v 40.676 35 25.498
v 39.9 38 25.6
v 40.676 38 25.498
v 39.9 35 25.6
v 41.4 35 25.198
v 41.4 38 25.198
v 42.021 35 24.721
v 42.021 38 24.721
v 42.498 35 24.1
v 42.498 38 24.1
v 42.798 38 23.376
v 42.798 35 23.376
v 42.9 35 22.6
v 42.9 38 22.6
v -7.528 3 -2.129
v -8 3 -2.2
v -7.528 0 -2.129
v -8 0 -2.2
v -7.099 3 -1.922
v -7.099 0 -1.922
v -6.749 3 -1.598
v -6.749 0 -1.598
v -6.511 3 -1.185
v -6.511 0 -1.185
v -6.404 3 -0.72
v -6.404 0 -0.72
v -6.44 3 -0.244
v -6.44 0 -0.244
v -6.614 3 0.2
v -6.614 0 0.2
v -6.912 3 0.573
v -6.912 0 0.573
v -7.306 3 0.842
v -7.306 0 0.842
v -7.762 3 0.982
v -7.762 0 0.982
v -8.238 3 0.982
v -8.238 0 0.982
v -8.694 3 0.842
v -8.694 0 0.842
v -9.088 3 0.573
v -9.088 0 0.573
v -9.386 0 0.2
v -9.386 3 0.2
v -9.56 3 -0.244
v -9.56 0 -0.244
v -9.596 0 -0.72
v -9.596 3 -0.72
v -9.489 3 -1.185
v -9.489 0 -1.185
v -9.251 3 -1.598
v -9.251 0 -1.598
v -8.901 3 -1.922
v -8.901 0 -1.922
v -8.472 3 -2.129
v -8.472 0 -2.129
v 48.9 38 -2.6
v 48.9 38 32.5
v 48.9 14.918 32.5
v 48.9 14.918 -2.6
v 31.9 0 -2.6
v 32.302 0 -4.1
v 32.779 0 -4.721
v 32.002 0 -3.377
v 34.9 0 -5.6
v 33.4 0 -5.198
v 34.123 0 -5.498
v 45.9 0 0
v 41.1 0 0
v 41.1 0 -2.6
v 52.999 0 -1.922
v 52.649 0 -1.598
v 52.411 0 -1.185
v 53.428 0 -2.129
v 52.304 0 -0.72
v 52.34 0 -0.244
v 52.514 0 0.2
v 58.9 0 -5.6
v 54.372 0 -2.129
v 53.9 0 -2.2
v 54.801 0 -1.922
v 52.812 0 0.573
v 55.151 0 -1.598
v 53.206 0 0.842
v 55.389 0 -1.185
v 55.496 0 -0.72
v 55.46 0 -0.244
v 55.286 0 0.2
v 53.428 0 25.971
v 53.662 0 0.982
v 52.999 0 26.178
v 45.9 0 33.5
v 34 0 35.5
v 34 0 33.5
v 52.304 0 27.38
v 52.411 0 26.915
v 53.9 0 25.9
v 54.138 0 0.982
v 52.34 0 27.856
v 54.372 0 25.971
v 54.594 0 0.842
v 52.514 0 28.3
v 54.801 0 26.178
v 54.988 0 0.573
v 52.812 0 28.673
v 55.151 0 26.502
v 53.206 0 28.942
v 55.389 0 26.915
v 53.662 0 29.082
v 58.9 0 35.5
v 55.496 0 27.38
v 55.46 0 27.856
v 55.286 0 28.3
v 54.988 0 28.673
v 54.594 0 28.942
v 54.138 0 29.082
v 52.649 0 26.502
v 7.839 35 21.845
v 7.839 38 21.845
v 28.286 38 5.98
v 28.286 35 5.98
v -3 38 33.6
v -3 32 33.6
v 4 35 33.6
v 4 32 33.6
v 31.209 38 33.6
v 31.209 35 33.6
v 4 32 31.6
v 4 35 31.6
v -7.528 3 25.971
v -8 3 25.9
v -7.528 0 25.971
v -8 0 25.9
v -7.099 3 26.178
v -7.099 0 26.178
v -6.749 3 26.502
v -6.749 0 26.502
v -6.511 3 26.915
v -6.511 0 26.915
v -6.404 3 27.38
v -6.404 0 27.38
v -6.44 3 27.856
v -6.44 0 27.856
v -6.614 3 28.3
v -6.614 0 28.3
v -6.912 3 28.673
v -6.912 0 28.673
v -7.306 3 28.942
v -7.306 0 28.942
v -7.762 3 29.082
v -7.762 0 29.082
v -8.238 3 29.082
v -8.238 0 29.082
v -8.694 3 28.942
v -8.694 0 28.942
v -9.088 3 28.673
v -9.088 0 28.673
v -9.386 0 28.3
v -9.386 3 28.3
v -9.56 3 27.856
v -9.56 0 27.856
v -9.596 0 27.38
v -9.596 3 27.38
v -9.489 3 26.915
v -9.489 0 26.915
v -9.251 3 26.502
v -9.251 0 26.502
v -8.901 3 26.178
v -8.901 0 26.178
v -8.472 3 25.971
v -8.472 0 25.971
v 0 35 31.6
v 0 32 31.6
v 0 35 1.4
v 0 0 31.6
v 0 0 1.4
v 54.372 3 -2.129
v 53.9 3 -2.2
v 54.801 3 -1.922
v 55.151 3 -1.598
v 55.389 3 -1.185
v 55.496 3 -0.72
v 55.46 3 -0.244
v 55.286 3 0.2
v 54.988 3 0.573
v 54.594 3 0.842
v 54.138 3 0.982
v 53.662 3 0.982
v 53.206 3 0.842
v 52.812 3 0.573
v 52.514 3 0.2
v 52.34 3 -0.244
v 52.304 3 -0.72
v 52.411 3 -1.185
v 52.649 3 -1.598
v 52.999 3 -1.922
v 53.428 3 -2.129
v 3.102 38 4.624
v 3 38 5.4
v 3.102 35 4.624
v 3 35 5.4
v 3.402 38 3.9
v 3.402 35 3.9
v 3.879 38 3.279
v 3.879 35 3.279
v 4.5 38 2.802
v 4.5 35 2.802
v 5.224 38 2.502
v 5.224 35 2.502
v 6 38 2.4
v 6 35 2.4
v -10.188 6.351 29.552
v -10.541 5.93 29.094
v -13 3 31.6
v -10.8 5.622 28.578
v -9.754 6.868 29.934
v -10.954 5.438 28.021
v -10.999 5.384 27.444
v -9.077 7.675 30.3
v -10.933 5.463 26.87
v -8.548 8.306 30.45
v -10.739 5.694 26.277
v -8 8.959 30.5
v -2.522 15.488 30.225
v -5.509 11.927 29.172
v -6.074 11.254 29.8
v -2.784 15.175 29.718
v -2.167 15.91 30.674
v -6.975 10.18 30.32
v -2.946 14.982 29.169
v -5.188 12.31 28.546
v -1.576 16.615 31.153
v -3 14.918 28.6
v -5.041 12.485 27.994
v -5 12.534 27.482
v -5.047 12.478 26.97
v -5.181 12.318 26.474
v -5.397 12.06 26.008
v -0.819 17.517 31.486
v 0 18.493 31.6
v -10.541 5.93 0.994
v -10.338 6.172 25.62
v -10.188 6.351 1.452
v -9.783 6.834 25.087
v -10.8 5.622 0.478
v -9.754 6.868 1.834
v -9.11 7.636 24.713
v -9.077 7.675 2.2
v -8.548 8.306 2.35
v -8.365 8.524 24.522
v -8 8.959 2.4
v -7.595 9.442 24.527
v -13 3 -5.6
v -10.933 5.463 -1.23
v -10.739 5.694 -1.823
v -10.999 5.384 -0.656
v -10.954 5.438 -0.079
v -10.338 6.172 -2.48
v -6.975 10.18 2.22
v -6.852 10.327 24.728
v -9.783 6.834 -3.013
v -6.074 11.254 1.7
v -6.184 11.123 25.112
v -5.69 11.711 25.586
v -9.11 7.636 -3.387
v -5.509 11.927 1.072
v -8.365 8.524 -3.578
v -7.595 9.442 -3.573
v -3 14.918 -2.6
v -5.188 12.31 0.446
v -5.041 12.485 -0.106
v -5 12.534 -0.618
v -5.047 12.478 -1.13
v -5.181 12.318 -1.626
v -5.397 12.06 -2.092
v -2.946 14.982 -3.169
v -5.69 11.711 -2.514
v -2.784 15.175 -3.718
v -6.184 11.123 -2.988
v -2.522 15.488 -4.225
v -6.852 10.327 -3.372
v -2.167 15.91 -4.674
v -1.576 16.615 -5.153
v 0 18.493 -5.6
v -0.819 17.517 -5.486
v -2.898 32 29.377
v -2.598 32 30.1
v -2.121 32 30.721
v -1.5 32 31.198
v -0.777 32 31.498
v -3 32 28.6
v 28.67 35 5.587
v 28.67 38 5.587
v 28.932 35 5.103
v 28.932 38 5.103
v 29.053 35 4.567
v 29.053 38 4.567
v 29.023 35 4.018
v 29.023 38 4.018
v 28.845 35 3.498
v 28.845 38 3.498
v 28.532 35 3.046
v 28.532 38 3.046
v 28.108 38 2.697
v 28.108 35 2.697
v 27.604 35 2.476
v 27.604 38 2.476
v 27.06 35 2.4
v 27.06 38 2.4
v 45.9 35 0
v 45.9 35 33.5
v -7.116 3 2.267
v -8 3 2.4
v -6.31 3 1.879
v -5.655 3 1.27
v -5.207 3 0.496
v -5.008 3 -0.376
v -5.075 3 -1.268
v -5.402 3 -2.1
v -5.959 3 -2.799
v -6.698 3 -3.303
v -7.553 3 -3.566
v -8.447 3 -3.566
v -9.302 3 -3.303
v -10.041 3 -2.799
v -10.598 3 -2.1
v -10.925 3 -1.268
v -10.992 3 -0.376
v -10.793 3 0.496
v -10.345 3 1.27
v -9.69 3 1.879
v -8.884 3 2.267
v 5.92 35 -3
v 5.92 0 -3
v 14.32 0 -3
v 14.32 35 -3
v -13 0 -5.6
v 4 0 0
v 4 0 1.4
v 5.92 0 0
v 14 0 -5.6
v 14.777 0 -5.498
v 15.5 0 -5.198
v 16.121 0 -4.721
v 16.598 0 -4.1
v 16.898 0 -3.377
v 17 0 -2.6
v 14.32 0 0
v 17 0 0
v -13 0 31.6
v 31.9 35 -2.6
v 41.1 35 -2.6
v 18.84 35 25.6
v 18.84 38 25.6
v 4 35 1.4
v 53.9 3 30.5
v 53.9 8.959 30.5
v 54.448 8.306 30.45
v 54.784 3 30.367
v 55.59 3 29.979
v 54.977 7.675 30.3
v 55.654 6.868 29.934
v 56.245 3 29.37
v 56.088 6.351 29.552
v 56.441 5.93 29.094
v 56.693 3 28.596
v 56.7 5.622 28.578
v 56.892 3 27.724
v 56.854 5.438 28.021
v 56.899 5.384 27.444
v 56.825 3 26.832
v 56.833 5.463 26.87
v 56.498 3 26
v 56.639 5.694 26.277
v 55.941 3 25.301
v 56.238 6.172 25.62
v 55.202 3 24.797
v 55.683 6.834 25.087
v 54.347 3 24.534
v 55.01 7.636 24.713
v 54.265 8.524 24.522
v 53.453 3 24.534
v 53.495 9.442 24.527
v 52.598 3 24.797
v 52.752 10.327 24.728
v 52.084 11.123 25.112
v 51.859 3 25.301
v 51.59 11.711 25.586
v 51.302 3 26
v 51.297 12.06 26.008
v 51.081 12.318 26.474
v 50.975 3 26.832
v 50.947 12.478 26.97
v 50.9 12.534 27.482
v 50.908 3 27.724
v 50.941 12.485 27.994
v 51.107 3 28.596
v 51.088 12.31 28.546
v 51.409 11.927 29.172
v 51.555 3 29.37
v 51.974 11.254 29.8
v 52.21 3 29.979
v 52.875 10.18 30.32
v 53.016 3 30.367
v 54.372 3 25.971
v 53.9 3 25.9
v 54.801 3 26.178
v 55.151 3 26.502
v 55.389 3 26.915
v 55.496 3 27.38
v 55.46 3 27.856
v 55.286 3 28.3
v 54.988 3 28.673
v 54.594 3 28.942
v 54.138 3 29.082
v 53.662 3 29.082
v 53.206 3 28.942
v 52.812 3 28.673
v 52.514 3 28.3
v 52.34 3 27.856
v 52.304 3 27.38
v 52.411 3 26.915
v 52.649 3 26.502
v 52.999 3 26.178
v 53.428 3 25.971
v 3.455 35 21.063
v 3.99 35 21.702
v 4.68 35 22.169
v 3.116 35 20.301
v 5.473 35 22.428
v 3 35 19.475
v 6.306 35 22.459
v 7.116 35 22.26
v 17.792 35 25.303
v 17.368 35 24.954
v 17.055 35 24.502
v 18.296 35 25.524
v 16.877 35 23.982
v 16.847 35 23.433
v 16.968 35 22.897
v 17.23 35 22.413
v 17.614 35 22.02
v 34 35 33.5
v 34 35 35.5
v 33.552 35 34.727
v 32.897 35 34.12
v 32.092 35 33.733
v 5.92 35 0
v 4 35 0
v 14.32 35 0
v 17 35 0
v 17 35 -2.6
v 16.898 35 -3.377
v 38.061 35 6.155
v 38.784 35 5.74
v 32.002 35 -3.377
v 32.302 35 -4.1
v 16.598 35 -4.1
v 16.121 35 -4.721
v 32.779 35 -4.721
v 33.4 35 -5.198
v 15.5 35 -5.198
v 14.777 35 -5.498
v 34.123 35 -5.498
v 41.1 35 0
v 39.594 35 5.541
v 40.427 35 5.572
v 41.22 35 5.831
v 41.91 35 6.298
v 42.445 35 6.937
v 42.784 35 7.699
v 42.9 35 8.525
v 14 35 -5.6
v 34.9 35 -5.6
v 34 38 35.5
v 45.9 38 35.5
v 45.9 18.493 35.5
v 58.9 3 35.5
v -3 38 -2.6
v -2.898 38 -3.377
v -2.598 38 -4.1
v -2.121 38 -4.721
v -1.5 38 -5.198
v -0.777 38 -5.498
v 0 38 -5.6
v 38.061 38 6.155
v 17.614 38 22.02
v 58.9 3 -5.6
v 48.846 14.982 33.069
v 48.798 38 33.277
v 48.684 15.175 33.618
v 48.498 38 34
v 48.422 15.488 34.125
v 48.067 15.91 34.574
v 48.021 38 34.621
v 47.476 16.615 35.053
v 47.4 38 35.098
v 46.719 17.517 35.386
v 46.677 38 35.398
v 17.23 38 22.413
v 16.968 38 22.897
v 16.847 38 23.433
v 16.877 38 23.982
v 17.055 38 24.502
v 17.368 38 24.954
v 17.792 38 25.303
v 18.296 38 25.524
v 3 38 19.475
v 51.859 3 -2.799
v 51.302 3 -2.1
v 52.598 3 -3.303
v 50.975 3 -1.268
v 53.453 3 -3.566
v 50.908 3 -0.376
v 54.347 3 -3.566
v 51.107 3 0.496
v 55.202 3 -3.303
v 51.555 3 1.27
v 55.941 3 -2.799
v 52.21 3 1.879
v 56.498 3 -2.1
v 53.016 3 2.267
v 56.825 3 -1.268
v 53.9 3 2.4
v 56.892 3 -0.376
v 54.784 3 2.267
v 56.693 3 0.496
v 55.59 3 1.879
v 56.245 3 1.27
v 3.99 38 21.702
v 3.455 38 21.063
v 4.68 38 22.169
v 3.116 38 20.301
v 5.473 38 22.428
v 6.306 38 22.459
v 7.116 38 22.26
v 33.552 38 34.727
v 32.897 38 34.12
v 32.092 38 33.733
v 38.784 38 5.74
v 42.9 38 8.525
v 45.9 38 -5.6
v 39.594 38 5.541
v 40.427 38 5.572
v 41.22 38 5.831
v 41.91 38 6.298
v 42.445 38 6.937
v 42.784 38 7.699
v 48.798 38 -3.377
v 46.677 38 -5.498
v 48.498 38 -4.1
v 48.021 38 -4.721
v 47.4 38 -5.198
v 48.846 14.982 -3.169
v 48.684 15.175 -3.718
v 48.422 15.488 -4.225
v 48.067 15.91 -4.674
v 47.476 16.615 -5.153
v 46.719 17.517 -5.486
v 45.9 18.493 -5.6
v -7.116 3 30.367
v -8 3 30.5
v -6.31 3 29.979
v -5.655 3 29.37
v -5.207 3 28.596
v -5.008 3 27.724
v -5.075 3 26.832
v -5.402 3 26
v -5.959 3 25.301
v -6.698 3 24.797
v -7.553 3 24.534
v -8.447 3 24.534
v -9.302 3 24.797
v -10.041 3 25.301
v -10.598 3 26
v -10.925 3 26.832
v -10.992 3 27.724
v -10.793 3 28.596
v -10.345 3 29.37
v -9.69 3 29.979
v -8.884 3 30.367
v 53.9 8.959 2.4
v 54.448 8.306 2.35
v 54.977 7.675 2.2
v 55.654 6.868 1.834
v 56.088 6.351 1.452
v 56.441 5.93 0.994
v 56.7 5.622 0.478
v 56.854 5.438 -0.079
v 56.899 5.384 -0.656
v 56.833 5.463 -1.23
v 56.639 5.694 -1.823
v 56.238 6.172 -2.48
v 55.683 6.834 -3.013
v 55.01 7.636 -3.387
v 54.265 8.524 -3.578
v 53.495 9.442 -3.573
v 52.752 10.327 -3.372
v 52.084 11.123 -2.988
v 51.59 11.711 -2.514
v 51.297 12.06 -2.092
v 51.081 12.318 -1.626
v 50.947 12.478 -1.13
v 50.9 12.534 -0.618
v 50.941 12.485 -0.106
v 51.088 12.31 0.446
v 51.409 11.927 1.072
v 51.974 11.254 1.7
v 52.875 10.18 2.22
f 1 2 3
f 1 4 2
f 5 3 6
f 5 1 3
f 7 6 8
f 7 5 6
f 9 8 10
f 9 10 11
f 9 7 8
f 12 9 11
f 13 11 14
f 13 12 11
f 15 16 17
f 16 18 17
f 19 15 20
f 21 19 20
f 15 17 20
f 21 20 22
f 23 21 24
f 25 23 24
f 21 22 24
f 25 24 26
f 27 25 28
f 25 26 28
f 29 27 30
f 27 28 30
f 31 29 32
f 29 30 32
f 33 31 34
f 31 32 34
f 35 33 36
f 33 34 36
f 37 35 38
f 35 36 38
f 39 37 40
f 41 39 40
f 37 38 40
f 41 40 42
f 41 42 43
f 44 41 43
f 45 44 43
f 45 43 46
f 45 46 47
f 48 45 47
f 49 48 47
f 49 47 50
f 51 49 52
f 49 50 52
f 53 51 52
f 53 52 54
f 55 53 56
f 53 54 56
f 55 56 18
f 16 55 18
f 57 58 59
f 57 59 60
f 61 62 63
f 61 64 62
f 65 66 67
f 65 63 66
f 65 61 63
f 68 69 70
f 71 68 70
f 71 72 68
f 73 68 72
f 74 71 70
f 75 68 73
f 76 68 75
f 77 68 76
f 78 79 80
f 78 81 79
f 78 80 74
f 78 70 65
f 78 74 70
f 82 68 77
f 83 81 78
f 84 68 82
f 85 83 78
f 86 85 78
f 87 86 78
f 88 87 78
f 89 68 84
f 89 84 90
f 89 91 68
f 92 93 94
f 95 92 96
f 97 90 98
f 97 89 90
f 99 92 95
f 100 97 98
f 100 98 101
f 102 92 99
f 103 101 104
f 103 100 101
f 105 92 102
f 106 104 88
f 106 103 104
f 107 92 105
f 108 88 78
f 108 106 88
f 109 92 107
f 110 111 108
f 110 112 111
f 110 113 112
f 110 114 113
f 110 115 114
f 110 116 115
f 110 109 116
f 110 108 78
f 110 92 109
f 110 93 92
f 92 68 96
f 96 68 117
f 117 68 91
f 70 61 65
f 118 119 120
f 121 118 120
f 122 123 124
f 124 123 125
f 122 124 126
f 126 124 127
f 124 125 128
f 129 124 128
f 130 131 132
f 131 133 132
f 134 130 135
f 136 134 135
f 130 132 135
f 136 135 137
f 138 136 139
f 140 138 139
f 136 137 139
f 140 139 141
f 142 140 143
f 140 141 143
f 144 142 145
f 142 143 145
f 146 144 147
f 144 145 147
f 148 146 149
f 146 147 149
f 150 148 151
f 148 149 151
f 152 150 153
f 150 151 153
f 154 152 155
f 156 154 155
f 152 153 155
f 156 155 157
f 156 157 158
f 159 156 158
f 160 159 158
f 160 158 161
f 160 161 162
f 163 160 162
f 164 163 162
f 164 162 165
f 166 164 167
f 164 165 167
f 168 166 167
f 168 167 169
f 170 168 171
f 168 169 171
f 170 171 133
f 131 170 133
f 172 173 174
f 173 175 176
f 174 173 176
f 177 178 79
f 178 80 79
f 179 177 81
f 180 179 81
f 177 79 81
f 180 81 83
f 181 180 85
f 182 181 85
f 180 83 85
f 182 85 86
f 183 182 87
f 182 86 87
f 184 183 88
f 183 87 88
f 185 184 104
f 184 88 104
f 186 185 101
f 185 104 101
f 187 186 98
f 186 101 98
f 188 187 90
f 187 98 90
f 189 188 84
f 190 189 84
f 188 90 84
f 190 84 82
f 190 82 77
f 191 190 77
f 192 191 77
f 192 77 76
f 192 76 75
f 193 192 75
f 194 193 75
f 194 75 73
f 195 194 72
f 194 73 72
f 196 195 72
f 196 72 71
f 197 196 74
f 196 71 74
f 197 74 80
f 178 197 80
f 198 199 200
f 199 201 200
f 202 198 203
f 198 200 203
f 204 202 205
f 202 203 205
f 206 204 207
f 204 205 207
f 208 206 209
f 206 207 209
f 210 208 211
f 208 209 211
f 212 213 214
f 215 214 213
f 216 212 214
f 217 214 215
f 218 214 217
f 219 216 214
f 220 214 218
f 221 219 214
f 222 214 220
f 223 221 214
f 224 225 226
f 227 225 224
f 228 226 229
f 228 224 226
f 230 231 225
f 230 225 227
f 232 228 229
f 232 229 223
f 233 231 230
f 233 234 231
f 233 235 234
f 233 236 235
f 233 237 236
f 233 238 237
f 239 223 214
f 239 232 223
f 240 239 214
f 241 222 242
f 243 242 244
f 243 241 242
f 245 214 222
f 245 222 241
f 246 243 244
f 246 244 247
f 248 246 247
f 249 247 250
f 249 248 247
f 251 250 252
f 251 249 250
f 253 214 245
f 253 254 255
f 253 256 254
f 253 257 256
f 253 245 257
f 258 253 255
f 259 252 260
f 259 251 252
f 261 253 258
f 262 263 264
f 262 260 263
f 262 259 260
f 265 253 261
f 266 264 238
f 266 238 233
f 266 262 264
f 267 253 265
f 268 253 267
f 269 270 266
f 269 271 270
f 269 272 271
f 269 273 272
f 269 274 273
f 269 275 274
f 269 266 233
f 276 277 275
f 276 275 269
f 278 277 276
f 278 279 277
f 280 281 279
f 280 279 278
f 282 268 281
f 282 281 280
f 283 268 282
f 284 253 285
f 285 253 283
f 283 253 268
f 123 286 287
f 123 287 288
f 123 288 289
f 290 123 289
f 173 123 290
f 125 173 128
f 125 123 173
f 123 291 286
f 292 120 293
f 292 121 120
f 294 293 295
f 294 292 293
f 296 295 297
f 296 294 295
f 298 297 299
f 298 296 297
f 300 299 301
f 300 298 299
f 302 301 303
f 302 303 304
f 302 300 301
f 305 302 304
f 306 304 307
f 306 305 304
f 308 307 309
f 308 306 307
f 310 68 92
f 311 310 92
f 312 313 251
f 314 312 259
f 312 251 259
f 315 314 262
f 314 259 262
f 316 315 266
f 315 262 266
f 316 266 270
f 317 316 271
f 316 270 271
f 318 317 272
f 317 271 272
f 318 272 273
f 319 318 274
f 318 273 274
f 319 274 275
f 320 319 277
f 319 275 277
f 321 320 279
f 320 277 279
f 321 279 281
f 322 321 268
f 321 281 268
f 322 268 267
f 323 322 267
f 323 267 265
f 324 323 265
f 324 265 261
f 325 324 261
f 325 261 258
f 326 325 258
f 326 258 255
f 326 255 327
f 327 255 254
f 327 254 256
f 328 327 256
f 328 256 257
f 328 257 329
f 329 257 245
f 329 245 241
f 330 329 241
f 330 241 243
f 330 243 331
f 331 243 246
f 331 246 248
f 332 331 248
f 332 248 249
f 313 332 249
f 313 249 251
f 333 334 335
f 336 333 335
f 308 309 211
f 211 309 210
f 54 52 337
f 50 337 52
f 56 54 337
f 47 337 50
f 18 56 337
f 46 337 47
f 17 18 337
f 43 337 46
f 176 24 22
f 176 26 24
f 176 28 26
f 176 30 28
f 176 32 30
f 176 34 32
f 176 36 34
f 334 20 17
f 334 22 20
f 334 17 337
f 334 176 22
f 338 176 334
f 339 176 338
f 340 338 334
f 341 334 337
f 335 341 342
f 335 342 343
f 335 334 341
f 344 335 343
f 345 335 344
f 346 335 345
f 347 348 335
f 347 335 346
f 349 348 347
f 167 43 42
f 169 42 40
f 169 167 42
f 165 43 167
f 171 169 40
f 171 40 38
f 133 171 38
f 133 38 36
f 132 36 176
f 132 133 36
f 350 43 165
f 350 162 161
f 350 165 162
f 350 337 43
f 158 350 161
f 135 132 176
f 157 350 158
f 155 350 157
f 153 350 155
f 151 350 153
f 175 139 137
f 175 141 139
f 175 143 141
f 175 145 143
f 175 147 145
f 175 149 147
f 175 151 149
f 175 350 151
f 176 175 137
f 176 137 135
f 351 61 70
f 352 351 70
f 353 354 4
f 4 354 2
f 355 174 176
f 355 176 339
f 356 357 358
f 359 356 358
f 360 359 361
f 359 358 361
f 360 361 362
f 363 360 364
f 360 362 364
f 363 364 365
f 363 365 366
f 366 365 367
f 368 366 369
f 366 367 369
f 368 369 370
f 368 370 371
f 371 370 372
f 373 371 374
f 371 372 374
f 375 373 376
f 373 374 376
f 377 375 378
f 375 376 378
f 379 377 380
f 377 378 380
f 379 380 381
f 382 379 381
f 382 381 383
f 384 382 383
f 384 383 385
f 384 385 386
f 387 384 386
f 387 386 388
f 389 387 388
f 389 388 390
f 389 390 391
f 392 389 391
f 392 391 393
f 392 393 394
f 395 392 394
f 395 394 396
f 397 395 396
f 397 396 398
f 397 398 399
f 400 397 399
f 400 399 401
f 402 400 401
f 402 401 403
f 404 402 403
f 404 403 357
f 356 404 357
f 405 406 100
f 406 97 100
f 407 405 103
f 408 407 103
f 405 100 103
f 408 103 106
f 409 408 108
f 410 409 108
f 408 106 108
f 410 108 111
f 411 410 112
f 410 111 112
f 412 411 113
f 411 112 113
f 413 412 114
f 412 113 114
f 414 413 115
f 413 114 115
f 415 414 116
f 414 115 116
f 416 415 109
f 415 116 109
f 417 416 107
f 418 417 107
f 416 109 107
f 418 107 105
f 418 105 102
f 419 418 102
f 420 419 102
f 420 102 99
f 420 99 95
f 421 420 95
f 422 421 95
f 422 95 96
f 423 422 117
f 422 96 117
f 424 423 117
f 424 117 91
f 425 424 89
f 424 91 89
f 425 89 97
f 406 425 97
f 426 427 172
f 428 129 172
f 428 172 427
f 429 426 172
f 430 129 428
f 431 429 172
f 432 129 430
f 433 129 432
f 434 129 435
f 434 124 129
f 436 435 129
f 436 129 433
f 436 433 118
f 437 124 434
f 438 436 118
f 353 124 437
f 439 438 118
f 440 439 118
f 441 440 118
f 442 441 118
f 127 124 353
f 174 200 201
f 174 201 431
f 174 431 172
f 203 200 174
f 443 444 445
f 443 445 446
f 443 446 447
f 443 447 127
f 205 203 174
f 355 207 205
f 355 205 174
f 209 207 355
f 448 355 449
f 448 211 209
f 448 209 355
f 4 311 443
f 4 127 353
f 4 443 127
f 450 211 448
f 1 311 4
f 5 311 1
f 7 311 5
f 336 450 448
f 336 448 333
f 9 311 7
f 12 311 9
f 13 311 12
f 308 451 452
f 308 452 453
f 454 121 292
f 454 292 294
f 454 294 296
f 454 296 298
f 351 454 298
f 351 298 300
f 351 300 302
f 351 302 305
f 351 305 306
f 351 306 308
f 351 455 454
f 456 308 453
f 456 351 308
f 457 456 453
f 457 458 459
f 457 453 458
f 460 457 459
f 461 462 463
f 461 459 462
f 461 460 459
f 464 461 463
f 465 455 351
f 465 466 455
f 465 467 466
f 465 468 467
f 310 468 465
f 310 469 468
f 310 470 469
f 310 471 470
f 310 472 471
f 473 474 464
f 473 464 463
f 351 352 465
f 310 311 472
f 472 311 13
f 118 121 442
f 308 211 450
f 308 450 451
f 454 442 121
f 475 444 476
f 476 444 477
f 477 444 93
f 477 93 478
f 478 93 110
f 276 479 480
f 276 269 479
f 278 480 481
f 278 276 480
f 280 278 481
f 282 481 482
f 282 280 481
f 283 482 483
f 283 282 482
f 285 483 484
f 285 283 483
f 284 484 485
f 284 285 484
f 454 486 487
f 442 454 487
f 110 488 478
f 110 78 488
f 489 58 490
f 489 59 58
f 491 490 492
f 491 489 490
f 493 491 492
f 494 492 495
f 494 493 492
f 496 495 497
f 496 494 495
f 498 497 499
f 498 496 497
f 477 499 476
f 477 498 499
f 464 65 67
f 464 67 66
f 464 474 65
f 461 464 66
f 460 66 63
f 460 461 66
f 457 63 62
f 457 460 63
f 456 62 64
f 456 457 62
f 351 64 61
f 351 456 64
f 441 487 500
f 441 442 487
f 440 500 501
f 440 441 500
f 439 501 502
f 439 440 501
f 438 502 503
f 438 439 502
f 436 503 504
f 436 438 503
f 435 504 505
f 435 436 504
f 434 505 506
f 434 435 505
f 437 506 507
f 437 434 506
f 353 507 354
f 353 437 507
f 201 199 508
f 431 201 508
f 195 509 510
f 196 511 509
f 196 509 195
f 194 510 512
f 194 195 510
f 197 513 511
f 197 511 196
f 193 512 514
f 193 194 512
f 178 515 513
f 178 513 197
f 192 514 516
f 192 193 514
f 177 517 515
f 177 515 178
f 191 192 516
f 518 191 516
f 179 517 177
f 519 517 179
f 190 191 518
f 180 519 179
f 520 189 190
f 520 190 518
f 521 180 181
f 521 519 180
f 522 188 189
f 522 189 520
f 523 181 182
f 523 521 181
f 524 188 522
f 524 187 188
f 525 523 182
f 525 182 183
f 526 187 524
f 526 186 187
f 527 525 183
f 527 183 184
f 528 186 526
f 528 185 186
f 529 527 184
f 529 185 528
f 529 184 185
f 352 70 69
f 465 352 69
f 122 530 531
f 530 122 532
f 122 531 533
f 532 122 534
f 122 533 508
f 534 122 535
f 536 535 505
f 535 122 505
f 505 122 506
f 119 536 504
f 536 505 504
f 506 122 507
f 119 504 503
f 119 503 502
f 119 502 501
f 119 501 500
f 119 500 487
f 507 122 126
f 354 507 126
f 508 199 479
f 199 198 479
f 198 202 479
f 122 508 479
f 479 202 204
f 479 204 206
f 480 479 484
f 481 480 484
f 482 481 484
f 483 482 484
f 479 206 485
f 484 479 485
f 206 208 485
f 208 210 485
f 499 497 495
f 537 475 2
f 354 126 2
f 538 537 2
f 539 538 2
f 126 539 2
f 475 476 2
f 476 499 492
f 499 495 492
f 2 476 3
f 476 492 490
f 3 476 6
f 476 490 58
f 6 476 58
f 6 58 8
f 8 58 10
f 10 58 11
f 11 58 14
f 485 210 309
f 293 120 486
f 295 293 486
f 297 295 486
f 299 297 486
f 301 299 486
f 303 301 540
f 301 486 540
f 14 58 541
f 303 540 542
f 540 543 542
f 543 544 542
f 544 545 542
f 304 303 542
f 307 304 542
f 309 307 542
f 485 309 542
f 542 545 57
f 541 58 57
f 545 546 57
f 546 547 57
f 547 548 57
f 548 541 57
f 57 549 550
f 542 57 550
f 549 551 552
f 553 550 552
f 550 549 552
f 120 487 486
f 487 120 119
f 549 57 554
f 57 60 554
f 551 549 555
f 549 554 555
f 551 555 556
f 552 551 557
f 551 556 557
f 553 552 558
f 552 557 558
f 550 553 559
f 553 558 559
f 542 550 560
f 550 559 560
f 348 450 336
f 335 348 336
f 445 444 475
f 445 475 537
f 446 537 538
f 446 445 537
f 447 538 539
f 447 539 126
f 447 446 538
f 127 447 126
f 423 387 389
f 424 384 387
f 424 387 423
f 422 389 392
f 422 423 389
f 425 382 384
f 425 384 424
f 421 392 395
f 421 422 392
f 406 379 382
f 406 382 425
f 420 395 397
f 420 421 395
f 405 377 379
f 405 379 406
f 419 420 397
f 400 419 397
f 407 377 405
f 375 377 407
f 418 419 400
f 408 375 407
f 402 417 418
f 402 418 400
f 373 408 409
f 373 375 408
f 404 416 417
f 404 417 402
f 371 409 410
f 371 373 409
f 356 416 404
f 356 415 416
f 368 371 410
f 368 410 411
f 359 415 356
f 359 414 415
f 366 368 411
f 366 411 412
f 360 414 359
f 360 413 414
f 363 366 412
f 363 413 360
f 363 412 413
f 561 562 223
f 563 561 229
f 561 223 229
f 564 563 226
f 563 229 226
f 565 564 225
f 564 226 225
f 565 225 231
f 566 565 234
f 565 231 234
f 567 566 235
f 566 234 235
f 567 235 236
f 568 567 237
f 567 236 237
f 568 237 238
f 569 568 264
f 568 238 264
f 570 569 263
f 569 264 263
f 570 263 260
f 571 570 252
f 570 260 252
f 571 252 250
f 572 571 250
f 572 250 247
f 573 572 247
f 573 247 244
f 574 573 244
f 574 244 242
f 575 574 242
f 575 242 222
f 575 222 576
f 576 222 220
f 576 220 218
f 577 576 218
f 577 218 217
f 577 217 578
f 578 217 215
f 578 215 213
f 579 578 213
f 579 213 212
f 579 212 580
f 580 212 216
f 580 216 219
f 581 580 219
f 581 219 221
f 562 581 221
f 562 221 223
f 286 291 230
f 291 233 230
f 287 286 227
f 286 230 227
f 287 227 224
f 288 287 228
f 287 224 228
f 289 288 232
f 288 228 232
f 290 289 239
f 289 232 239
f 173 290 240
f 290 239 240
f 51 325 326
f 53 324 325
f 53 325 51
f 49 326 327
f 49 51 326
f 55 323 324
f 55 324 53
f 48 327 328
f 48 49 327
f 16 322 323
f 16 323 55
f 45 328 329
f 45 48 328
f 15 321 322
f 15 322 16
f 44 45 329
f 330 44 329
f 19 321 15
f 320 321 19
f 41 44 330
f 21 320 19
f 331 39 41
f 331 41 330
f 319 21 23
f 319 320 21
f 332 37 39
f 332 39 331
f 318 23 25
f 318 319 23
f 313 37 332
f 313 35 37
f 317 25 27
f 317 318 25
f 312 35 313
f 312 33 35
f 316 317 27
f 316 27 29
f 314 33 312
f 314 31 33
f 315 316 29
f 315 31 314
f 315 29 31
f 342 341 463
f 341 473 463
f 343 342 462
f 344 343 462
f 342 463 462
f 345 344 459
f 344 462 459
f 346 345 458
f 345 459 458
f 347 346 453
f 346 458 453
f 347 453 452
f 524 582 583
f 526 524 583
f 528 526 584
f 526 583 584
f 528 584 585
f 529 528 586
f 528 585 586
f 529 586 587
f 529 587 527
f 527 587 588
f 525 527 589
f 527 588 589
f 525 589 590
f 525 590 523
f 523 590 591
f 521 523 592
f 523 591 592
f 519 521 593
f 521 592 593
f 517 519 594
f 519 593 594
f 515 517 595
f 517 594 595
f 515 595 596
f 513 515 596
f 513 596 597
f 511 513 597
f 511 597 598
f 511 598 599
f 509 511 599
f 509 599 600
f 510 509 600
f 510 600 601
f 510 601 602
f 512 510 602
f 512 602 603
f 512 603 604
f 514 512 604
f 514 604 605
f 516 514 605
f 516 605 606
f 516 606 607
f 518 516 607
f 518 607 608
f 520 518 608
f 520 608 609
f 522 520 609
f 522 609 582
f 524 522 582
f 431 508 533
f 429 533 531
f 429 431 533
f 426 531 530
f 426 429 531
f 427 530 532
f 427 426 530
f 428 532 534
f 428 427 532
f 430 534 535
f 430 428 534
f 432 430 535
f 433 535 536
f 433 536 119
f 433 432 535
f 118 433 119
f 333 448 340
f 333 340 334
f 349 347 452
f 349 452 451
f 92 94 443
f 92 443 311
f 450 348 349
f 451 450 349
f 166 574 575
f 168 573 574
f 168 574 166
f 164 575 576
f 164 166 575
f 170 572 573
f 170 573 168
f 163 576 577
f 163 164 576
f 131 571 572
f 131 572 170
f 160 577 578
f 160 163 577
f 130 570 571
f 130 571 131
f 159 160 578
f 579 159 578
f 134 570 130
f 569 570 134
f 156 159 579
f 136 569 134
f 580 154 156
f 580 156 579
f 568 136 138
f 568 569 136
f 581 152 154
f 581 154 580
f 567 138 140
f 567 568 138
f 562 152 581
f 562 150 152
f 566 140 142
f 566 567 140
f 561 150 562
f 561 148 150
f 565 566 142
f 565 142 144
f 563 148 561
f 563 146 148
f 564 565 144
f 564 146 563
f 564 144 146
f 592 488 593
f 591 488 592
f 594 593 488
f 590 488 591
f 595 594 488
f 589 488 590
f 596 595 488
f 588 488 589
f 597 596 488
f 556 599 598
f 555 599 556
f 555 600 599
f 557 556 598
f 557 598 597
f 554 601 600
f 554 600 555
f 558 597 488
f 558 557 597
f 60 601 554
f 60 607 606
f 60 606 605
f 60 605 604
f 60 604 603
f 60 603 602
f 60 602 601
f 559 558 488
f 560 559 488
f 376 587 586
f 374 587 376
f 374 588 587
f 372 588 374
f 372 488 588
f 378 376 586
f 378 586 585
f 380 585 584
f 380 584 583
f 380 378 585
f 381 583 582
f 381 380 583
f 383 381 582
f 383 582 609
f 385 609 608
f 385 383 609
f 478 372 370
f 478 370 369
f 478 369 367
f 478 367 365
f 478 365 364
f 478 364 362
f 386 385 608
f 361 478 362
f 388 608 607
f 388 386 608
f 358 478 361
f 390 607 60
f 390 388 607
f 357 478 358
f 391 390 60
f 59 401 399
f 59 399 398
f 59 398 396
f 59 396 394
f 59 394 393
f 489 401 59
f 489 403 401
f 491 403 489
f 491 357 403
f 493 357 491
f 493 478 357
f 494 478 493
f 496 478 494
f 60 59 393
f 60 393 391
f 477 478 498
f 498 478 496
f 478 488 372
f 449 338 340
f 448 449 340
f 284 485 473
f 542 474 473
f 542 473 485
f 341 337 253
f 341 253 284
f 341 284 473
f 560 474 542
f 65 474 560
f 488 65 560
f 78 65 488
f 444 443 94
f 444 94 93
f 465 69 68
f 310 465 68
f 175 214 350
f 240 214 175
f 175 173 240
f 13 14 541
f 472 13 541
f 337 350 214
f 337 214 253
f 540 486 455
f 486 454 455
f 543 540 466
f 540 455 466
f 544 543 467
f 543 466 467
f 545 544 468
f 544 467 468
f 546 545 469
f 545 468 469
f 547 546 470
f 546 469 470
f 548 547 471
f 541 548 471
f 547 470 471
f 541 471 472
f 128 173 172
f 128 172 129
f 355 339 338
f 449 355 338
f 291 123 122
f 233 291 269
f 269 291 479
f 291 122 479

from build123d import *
from OCP.BRepFilletAPI import BRepFilletAPI_MakeFillet

# Parameters (mm, degrees)
SKETCH_1_W           = 71.9
SKETCH_1_H           = 40.1
SKETCH_1_W_2         = 4
SKETCH_1_H_2         = 1.4
SKETCH_1_H_3         = 0.9
EXTRUDE_1_DEPTH      = 35
SKETCH_4_W           = 8.4
SKETCH_4_H           = 4.4
SKETCH_4_W_2         = 30
SKETCH_4_H_2         = 2
CUT_EXTRUDE_2_DEPTH  = 77.710233998
SKETCH_5_W           = 71.9
SKETCH_5_H           = 40.1
EXTRUDE_2_DEPTH      = 3
SKETCH_6_W           = 47
SKETCH_6_H           = 0.9
CUT_EXTRUDE_3_DEPTH  = 79.124643999
SKETCH_7_R           = 1.6
CUT_EXTRUDE_4_DEPTH  = 79.124643999
SKETCH_10_W          = 10
SKETCH_10_H          = 39.2
SKETCH_10_H_2        = 40.1
CUT_EXTRUDE_6_DEPTH  = 35
CHAMFER_1_SIZE       = 10
CHAMFER_1_SIZE_2     = 11.917535926
SKETCH_8_R           = 3
CUT_EXTRUDE_5_DEPTH  = 35
SKETCH_11_W          = 17
SKETCH_11_H          = 32
CUT_EXTRUDE_7_DEPTH  = 2
CUT_EXTRUDE_8_DEPTH  = 79.124643999
FILLET_2_R1          = 2
FILLET_2_R2          = 3
SKETCH_13_W          = 24.9
SKETCH_13_H          = 1
EXTRUDE_3_DEPTH      = 38
SKETCH_14_W          = 11.9
SKETCH_14_H          = 1
CUT_EXTRUDE_9_DEPTH  = 35
CUT_EXTRUDE_10_REACH = 80.571
SKETCH_15_W          = 10
SKETCH_15_H          = 1
FILLET_3_R           = 3
FILLET_4_R           = 3
SKETCH_16_W          = 14.9
SKETCH_16_H          = 5.6
CUT_EXTRUDE_11_DEPTH = 35
FILLET_5_R           = 3


# Some blends are built 0.0001 mm under size
with BuildPart() as part:
    # 草图1 → 凸台-拉伸1 (new body)
    # profile 1 of 3: a face of its own
    with BuildSketch(Plane(origin=(0, 0, 0), x_dir=(1, 0, 0), z_dir=(0, 1, 0))):
        with Locations((22.95, -14.45)):
            Rectangle(SKETCH_1_W, SKETCH_1_H)
        Polygon((45.9, -32.5), (0, -32.5), (0, 0), (26.7, 0), (26.7, 2.6), (41.1, 2.6), (41.1, 0), (45.9, 0), align=None, mode=Mode.SUBTRACT)
    # profile 2 of 3: a face of its own
    with BuildSketch(Plane(origin=(0, 0, 0), x_dir=(1, 0, 0), z_dir=(0, 1, 0))):
        with Locations((2, -0.7)):
            Rectangle(SKETCH_1_W_2, SKETCH_1_H_2)
    # profile 3 of 3: a face of its own
    with BuildSketch(Plane(origin=(0, 0, 0), x_dir=(1, 0, 0), z_dir=(0, 1, 0))):
        with Locations((2, -32.05)):
            Rectangle(SKETCH_1_W_2, SKETCH_1_H_3)
    extrude(amount=EXTRUDE_1_DEPTH)

    # 草图4 → 切除-拉伸2 (cut, through all)
    with BuildSketch(Plane(origin=(0, 35, 0), x_dir=(1, 0, 0), z_dir=(0, 1, 0))):
        with Locations((10.12, 0.8)):
            Rectangle(SKETCH_4_W, SKETCH_4_H)
        with Locations((19, -33.5)):
            Rectangle(SKETCH_4_W_2, SKETCH_4_H_2)
    extrude(amount=-CUT_EXTRUDE_2_DEPTH, mode=Mode.SUBTRACT)

    # 草图5 → 凸台-拉伸2 (add)
    with BuildSketch(Plane(origin=(0, 35, 0), x_dir=(1, 0, 0), z_dir=(0, 1, 0))):
        with Locations((22.95, -14.45)):
            Rectangle(SKETCH_5_W, SKETCH_5_H)
    extrude(amount=EXTRUDE_2_DEPTH)

    # 草图6 → 切除-拉伸3 (cut, through all)
    with BuildSketch(Plane.XZ):
        with Locations((10.5, 34.05)):
            Rectangle(SKETCH_6_W, SKETCH_6_H)
    extrude(amount=-CUT_EXTRUDE_3_DEPTH, mode=Mode.SUBTRACT)

    # 草图7 → 切除-拉伸4 (cut, through all)
    with BuildSketch(Plane.XZ):
        with Locations(Location((-8, 27.5, 0), (0, 0, 270))):
            Circle(SKETCH_7_R)
        with Locations(Location((53.9, 27.5, 0), (0, 0, 270))):
            Circle(SKETCH_7_R)
        with Locations(Location((-8, -0.6, 0), (0, 0, 270))):
            Circle(SKETCH_7_R)
        with Locations(Location((53.9, -0.6, 0), (0, 0, 270))):
            Circle(SKETCH_7_R)
    extrude(amount=-CUT_EXTRUDE_4_DEPTH, mode=Mode.SUBTRACT)

    # 草图10 → 切除-拉伸6 (cut)
    with BuildSketch(Plane(origin=(0, 38, 0), x_dir=(1, 0, 0), z_dir=(0, 1, 0))):
        with Locations((-8, -14)):
            Rectangle(SKETCH_10_W, SKETCH_10_H)
        with Locations((53.9, -14.45)):
            Rectangle(SKETCH_10_W, SKETCH_10_H_2)
    extrude(amount=-CUT_EXTRUDE_6_DEPTH, mode=Mode.SUBTRACT)

    # 倒角1
    # the kernel refuses this chamfer: 11.917535926, 10 mm, written as the material it adds along each edge
    with BuildSketch(Plane(origin=(48.9, 3, -5.6), x_dir=(0.9993728857116146, -0.03540953691366307, 0), z_dir=(0, 0, 1))) as chamfer_1_piece_1_section:
        Polygon((CHAMFER_1_SIZE * 0.999372885712, CHAMFER_1_SIZE * 0.0354095369137), (-CHAMFER_1_SIZE_2 * 0.0354095369135, CHAMFER_1_SIZE_2 * 0.999372885707), (0, 0), align=None)
    chamfer_1_piece_1 = extrude(amount=40.1, mode=Mode.PRIVATE)
    chamfer_1_piece_1 = split(chamfer_1_piece_1, bisect_by=Plane(origin=(58.9, 6.996958781, 14.489120948), z_dir=(-1, 0, 0)), keep=Keep.TOP, mode=Mode.PRIVATE)
    chamfer_1_piece_1 = chamfer_1_piece_1 - Plane(origin=(53.9, 6.996958781, 27.5), x_dir=(0, 0, -1), z_dir=(0, -1, 0)) * Cylinder(1.6, 128, mode=Mode.PRIVATE)
    chamfer_1_piece_1 = chamfer_1_piece_1 - Plane(origin=(53.9, 6.996958781, -0.6), x_dir=(0, 0, -1), z_dir=(0, -1, 0)) * Cylinder(1.6, 128, mode=Mode.PRIVATE)
    add(chamfer_1_piece_1)
    with BuildSketch(Plane(origin=(-3, 3, -5.6), x_dir=(-0.9993728857116146, -0.03540953691366305, 0), z_dir=(0, 0, 1))) as chamfer_1_piece_2_section:
        Polygon((CHAMFER_1_SIZE * 0.999372885712, -CHAMFER_1_SIZE * 0.0354095369137), (-CHAMFER_1_SIZE_2 * 0.0354095369135, -CHAMFER_1_SIZE_2 * 0.999372885707), (0, 0), align=None)
    chamfer_1_piece_2 = extrude(amount=39.2, mode=Mode.PRIVATE)
    chamfer_1_piece_2 = split(chamfer_1_piece_2, bisect_by=Plane(origin=(-13, 6.997914765, 14.022030522), z_dir=(1, 0, 0)), keep=Keep.TOP, mode=Mode.PRIVATE)
    chamfer_1_piece_2 = chamfer_1_piece_2 - Plane(origin=(-8, 6.997914765, 27.5), x_dir=(0, 0, -1), z_dir=(0, -1, 0)) * Cylinder(1.6, 127, mode=Mode.PRIVATE)
    chamfer_1_piece_2 = chamfer_1_piece_2 - Plane(origin=(-8, 6.997914765, -0.6), x_dir=(0, 0, -1), z_dir=(0, -1, 0)) * Cylinder(1.6, 127, mode=Mode.PRIVATE)
    add(chamfer_1_piece_2)

    # 草图8 → 切除-拉伸5 (cut)
    with BuildSketch(Plane(origin=(0, 38, 0), x_dir=(1, 0, 0), z_dir=(0, 1, 0))):
        with Locations(Location((-8, 0.6, 0), (0, 0, 270))):
            Circle(SKETCH_8_R)
        with Locations(Location((53.9, 0.6, 0), (0, 0, 270))):
            Circle(SKETCH_8_R)
        with Locations(Location((53.9, -27.5, 0), (0, 0, 270))):
            Circle(SKETCH_8_R)
        with Locations(Location((-8, -27.5, 0), (0, 0, 270))):
            Circle(SKETCH_8_R)
    extrude(amount=-CUT_EXTRUDE_5_DEPTH, mode=Mode.SUBTRACT)

    # 草图11 → 切除-拉伸7 (cut)
    with BuildSketch(Plane.XY.offset(33.6)):
        with Locations((-4.5, 16)):
            Rectangle(SKETCH_11_W, SKETCH_11_H)
    extrude(amount=-CUT_EXTRUDE_7_DEPTH, mode=Mode.SUBTRACT)

    # 草图12 → 切除-拉伸8 (cut, through all)
    with BuildSketch(Plane(origin=(0, 38, 0), x_dir=(1, 0, 0), z_dir=(0, 1, 0))):
        Polygon((3, -2.4), (3, -25.6), (32.9, -2.4), align=None)
        Polygon((42.9, -2.4), (13, -25.6), (42.9, -25.6), align=None)
    extrude(amount=-CUT_EXTRUDE_8_DEPTH, mode=Mode.SUBTRACT)

    # 圆角2: one fillet with a radius per group of edges: ONE call of the kernel's fillet builder (fillet() takes one radius for all edges)
    fillet_2_edges_1 = [part.edges().sort_by_distance(p)[0] for p in [
        (13, 36.5, 25.6),
        (32.9, 36.5, 2.4),
    ]]
    fillet_2_edges_2 = [part.edges().sort_by_distance(p)[0] for p in [
        (3, 36.5, 25.6),
        (42.9, 36.5, 25.6),
        (42.9, 36.5, 2.4),
        (3, 36.5, 2.4),
    ]]
    fillet_2 = BRepFilletAPI_MakeFillet(part.part.solid().wrapped)
    for e in fillet_2_edges_1:
        fillet_2.Add(FILLET_2_R1, e.wrapped)
    for e in fillet_2_edges_2:
        fillet_2.Add(FILLET_2_R2, e.wrapped)
    add(Compound.cast(fillet_2.Shape()), mode=Mode.REPLACE)

    # 草图13 → 凸台-拉伸3 (add)
    with BuildSketch(Plane.XZ):
        with Locations((46.45, 35)):
            Rectangle(SKETCH_13_W, SKETCH_13_H)
    extrude(amount=-EXTRUDE_3_DEPTH)

    # 草图14 → 切除-拉伸9 (cut)
    with BuildSketch(Plane.XZ):
        with Locations((39.95, 33)):
            Rectangle(SKETCH_14_W, SKETCH_14_H)
    extrude(amount=-CUT_EXTRUDE_9_DEPTH, mode=Mode.SUBTRACT)

    # 切除-拉伸10: up to this face of the body (flat: up to its plane)
    cut_extrude_10_end = Plane(part.part.faces().sort_by_distance((53.9, 8.958767963, 14.614170269))[0])
    # 草图15 → 切除-拉伸10 (cut, up to the picked face)
    with BuildSketch(Plane(origin=(0, 38, 0), x_dir=(1, 0, 0), z_dir=(0, 1, 0)), mode=Mode.PRIVATE) as cut_extrude_10_sk1:
        with Locations((53.9, -35)):
            Rectangle(SKETCH_15_W, SKETCH_15_H)
    cut_extrude_10_tool1 = split(extrude(cut_extrude_10_sk1.sketch, amount=-CUT_EXTRUDE_10_REACH, mode=Mode.PRIVATE), bisect_by=cut_extrude_10_end, keep=Keep.BOTH, mode=Mode.PRIVATE)
    add(cut_extrude_10_tool1.solids().sort_by(Axis((53.9, 38, 35), (0, -1, 0)))[0], mode=Mode.SUBTRACT)

    # 圆角3
    fillet_3_edges = [part.edges().sort_by_distance(p)[0] for p in [
        (-3, 26.458767963, -5.6),
        (48.9, 26.458767963, -5.6),
        (48.9, 26.458767963, 35.5),
        (-3, 23.458767963, 31.6),
    ]]
    fillet(fillet_3_edges, radius=FILLET_3_R - 0.0001)  # a hair under: the kernel refuses the full size

    # 圆角4
    # the kernel refuses this fillet: 3 mm, written as the material it adds along each edge
    with BuildSketch(Plane(origin=(34, 35, 33.6), x_dir=(0, 0, 1), z_dir=(0, 1, 0))) as fillet_4_piece_1:
        with BuildLine():
            CenterArc((3, -2.791057147), FILLET_4_R, 111.510188267, 68.489811733)
            Line((0, -2.791057147), (-0.06, -2.791057147))
            Line((-0.06, -2.791057147), (-0.06, 0))
            Line((-0.06, 0), (0, 0.06))
            ThreePointArc((0, 0.06), (0.95, 0.06), (1.878, 0.055821143))
            Line((1.878, 0.055821143), (1.9, 0))
        make_face()
    extrude(amount=3)

    # 草图16 → 切除-拉伸11 (cut)
    with BuildSketch(Plane.XZ):
        with Locations((24.45, -2.8)):
            Rectangle(SKETCH_16_W, SKETCH_16_H)
    extrude(amount=-CUT_EXTRUDE_11_DEPTH, mode=Mode.SUBTRACT)

    # 圆角5
    fillet_5_edges = [part.edges().sort_by_distance(p)[0] for p in [
        (31.9, 17.5, -5.6),
        (17, 17.5, -5.6),
    ]]
    fillet(fillet_5_edges, radius=FILLET_5_R - 0.0001)  # a hair under: the kernel refuses the full size


solid = part.part
